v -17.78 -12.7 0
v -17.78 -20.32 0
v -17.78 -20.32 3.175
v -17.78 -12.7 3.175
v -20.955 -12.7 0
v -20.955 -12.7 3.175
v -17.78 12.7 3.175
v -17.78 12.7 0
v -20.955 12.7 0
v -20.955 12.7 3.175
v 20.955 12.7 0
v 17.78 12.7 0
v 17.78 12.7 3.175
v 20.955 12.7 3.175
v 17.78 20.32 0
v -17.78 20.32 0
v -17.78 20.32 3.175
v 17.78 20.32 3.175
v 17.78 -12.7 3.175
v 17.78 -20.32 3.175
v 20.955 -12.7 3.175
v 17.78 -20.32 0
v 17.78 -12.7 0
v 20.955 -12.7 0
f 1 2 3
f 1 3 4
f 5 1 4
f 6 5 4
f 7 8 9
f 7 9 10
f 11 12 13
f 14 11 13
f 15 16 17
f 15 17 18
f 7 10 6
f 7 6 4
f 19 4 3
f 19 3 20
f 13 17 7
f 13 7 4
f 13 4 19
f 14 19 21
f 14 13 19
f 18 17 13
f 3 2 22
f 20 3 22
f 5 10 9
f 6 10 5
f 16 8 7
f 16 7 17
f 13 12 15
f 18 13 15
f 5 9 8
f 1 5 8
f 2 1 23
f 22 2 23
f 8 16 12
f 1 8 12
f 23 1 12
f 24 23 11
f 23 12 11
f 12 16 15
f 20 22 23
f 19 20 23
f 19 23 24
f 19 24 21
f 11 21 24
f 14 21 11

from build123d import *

# Parameters (mm, degrees)
F0_W     = 35.56
F0_H     = 40.64
F1_DEPTH = 3.175
F2_W     = 25.4
F2_H     = 3.175
F3_DEPTH = 3.175
F4_W     = 25.4
F4_H     = 3.175
F5_DEPTH = 3.175


# Not quite as in the source:
# - a length typed as a fraction of an inch, garbled in the dataset ("3 / 203.2 mm" for 3/8 in), is restored


with BuildPart() as f1:
    # F0 (on Top) → F1 (new body)
    with BuildSketch(Plane.XY):
        Rectangle(F0_W, F0_H)
    extrude(amount=F1_DEPTH)

    # F2 (on face) → F3 (join)
    with BuildSketch(Plane(origin=(-17.78, 0, 0), x_dir=(0, -1, 0), z_dir=(-1, 0, 0))):
        with Locations((0, 1.5875)):
            Rectangle(F2_W, F2_H)
    extrude(amount=F3_DEPTH)

    # F4 (on face) → F5 (join)
    with BuildSketch(Plane.YZ.offset(17.78)):
        with Locations((0, 1.5875)):
            Rectangle(F4_W, F4_H)
    extrude(amount=F5_DEPTH)


solid = f1.part
